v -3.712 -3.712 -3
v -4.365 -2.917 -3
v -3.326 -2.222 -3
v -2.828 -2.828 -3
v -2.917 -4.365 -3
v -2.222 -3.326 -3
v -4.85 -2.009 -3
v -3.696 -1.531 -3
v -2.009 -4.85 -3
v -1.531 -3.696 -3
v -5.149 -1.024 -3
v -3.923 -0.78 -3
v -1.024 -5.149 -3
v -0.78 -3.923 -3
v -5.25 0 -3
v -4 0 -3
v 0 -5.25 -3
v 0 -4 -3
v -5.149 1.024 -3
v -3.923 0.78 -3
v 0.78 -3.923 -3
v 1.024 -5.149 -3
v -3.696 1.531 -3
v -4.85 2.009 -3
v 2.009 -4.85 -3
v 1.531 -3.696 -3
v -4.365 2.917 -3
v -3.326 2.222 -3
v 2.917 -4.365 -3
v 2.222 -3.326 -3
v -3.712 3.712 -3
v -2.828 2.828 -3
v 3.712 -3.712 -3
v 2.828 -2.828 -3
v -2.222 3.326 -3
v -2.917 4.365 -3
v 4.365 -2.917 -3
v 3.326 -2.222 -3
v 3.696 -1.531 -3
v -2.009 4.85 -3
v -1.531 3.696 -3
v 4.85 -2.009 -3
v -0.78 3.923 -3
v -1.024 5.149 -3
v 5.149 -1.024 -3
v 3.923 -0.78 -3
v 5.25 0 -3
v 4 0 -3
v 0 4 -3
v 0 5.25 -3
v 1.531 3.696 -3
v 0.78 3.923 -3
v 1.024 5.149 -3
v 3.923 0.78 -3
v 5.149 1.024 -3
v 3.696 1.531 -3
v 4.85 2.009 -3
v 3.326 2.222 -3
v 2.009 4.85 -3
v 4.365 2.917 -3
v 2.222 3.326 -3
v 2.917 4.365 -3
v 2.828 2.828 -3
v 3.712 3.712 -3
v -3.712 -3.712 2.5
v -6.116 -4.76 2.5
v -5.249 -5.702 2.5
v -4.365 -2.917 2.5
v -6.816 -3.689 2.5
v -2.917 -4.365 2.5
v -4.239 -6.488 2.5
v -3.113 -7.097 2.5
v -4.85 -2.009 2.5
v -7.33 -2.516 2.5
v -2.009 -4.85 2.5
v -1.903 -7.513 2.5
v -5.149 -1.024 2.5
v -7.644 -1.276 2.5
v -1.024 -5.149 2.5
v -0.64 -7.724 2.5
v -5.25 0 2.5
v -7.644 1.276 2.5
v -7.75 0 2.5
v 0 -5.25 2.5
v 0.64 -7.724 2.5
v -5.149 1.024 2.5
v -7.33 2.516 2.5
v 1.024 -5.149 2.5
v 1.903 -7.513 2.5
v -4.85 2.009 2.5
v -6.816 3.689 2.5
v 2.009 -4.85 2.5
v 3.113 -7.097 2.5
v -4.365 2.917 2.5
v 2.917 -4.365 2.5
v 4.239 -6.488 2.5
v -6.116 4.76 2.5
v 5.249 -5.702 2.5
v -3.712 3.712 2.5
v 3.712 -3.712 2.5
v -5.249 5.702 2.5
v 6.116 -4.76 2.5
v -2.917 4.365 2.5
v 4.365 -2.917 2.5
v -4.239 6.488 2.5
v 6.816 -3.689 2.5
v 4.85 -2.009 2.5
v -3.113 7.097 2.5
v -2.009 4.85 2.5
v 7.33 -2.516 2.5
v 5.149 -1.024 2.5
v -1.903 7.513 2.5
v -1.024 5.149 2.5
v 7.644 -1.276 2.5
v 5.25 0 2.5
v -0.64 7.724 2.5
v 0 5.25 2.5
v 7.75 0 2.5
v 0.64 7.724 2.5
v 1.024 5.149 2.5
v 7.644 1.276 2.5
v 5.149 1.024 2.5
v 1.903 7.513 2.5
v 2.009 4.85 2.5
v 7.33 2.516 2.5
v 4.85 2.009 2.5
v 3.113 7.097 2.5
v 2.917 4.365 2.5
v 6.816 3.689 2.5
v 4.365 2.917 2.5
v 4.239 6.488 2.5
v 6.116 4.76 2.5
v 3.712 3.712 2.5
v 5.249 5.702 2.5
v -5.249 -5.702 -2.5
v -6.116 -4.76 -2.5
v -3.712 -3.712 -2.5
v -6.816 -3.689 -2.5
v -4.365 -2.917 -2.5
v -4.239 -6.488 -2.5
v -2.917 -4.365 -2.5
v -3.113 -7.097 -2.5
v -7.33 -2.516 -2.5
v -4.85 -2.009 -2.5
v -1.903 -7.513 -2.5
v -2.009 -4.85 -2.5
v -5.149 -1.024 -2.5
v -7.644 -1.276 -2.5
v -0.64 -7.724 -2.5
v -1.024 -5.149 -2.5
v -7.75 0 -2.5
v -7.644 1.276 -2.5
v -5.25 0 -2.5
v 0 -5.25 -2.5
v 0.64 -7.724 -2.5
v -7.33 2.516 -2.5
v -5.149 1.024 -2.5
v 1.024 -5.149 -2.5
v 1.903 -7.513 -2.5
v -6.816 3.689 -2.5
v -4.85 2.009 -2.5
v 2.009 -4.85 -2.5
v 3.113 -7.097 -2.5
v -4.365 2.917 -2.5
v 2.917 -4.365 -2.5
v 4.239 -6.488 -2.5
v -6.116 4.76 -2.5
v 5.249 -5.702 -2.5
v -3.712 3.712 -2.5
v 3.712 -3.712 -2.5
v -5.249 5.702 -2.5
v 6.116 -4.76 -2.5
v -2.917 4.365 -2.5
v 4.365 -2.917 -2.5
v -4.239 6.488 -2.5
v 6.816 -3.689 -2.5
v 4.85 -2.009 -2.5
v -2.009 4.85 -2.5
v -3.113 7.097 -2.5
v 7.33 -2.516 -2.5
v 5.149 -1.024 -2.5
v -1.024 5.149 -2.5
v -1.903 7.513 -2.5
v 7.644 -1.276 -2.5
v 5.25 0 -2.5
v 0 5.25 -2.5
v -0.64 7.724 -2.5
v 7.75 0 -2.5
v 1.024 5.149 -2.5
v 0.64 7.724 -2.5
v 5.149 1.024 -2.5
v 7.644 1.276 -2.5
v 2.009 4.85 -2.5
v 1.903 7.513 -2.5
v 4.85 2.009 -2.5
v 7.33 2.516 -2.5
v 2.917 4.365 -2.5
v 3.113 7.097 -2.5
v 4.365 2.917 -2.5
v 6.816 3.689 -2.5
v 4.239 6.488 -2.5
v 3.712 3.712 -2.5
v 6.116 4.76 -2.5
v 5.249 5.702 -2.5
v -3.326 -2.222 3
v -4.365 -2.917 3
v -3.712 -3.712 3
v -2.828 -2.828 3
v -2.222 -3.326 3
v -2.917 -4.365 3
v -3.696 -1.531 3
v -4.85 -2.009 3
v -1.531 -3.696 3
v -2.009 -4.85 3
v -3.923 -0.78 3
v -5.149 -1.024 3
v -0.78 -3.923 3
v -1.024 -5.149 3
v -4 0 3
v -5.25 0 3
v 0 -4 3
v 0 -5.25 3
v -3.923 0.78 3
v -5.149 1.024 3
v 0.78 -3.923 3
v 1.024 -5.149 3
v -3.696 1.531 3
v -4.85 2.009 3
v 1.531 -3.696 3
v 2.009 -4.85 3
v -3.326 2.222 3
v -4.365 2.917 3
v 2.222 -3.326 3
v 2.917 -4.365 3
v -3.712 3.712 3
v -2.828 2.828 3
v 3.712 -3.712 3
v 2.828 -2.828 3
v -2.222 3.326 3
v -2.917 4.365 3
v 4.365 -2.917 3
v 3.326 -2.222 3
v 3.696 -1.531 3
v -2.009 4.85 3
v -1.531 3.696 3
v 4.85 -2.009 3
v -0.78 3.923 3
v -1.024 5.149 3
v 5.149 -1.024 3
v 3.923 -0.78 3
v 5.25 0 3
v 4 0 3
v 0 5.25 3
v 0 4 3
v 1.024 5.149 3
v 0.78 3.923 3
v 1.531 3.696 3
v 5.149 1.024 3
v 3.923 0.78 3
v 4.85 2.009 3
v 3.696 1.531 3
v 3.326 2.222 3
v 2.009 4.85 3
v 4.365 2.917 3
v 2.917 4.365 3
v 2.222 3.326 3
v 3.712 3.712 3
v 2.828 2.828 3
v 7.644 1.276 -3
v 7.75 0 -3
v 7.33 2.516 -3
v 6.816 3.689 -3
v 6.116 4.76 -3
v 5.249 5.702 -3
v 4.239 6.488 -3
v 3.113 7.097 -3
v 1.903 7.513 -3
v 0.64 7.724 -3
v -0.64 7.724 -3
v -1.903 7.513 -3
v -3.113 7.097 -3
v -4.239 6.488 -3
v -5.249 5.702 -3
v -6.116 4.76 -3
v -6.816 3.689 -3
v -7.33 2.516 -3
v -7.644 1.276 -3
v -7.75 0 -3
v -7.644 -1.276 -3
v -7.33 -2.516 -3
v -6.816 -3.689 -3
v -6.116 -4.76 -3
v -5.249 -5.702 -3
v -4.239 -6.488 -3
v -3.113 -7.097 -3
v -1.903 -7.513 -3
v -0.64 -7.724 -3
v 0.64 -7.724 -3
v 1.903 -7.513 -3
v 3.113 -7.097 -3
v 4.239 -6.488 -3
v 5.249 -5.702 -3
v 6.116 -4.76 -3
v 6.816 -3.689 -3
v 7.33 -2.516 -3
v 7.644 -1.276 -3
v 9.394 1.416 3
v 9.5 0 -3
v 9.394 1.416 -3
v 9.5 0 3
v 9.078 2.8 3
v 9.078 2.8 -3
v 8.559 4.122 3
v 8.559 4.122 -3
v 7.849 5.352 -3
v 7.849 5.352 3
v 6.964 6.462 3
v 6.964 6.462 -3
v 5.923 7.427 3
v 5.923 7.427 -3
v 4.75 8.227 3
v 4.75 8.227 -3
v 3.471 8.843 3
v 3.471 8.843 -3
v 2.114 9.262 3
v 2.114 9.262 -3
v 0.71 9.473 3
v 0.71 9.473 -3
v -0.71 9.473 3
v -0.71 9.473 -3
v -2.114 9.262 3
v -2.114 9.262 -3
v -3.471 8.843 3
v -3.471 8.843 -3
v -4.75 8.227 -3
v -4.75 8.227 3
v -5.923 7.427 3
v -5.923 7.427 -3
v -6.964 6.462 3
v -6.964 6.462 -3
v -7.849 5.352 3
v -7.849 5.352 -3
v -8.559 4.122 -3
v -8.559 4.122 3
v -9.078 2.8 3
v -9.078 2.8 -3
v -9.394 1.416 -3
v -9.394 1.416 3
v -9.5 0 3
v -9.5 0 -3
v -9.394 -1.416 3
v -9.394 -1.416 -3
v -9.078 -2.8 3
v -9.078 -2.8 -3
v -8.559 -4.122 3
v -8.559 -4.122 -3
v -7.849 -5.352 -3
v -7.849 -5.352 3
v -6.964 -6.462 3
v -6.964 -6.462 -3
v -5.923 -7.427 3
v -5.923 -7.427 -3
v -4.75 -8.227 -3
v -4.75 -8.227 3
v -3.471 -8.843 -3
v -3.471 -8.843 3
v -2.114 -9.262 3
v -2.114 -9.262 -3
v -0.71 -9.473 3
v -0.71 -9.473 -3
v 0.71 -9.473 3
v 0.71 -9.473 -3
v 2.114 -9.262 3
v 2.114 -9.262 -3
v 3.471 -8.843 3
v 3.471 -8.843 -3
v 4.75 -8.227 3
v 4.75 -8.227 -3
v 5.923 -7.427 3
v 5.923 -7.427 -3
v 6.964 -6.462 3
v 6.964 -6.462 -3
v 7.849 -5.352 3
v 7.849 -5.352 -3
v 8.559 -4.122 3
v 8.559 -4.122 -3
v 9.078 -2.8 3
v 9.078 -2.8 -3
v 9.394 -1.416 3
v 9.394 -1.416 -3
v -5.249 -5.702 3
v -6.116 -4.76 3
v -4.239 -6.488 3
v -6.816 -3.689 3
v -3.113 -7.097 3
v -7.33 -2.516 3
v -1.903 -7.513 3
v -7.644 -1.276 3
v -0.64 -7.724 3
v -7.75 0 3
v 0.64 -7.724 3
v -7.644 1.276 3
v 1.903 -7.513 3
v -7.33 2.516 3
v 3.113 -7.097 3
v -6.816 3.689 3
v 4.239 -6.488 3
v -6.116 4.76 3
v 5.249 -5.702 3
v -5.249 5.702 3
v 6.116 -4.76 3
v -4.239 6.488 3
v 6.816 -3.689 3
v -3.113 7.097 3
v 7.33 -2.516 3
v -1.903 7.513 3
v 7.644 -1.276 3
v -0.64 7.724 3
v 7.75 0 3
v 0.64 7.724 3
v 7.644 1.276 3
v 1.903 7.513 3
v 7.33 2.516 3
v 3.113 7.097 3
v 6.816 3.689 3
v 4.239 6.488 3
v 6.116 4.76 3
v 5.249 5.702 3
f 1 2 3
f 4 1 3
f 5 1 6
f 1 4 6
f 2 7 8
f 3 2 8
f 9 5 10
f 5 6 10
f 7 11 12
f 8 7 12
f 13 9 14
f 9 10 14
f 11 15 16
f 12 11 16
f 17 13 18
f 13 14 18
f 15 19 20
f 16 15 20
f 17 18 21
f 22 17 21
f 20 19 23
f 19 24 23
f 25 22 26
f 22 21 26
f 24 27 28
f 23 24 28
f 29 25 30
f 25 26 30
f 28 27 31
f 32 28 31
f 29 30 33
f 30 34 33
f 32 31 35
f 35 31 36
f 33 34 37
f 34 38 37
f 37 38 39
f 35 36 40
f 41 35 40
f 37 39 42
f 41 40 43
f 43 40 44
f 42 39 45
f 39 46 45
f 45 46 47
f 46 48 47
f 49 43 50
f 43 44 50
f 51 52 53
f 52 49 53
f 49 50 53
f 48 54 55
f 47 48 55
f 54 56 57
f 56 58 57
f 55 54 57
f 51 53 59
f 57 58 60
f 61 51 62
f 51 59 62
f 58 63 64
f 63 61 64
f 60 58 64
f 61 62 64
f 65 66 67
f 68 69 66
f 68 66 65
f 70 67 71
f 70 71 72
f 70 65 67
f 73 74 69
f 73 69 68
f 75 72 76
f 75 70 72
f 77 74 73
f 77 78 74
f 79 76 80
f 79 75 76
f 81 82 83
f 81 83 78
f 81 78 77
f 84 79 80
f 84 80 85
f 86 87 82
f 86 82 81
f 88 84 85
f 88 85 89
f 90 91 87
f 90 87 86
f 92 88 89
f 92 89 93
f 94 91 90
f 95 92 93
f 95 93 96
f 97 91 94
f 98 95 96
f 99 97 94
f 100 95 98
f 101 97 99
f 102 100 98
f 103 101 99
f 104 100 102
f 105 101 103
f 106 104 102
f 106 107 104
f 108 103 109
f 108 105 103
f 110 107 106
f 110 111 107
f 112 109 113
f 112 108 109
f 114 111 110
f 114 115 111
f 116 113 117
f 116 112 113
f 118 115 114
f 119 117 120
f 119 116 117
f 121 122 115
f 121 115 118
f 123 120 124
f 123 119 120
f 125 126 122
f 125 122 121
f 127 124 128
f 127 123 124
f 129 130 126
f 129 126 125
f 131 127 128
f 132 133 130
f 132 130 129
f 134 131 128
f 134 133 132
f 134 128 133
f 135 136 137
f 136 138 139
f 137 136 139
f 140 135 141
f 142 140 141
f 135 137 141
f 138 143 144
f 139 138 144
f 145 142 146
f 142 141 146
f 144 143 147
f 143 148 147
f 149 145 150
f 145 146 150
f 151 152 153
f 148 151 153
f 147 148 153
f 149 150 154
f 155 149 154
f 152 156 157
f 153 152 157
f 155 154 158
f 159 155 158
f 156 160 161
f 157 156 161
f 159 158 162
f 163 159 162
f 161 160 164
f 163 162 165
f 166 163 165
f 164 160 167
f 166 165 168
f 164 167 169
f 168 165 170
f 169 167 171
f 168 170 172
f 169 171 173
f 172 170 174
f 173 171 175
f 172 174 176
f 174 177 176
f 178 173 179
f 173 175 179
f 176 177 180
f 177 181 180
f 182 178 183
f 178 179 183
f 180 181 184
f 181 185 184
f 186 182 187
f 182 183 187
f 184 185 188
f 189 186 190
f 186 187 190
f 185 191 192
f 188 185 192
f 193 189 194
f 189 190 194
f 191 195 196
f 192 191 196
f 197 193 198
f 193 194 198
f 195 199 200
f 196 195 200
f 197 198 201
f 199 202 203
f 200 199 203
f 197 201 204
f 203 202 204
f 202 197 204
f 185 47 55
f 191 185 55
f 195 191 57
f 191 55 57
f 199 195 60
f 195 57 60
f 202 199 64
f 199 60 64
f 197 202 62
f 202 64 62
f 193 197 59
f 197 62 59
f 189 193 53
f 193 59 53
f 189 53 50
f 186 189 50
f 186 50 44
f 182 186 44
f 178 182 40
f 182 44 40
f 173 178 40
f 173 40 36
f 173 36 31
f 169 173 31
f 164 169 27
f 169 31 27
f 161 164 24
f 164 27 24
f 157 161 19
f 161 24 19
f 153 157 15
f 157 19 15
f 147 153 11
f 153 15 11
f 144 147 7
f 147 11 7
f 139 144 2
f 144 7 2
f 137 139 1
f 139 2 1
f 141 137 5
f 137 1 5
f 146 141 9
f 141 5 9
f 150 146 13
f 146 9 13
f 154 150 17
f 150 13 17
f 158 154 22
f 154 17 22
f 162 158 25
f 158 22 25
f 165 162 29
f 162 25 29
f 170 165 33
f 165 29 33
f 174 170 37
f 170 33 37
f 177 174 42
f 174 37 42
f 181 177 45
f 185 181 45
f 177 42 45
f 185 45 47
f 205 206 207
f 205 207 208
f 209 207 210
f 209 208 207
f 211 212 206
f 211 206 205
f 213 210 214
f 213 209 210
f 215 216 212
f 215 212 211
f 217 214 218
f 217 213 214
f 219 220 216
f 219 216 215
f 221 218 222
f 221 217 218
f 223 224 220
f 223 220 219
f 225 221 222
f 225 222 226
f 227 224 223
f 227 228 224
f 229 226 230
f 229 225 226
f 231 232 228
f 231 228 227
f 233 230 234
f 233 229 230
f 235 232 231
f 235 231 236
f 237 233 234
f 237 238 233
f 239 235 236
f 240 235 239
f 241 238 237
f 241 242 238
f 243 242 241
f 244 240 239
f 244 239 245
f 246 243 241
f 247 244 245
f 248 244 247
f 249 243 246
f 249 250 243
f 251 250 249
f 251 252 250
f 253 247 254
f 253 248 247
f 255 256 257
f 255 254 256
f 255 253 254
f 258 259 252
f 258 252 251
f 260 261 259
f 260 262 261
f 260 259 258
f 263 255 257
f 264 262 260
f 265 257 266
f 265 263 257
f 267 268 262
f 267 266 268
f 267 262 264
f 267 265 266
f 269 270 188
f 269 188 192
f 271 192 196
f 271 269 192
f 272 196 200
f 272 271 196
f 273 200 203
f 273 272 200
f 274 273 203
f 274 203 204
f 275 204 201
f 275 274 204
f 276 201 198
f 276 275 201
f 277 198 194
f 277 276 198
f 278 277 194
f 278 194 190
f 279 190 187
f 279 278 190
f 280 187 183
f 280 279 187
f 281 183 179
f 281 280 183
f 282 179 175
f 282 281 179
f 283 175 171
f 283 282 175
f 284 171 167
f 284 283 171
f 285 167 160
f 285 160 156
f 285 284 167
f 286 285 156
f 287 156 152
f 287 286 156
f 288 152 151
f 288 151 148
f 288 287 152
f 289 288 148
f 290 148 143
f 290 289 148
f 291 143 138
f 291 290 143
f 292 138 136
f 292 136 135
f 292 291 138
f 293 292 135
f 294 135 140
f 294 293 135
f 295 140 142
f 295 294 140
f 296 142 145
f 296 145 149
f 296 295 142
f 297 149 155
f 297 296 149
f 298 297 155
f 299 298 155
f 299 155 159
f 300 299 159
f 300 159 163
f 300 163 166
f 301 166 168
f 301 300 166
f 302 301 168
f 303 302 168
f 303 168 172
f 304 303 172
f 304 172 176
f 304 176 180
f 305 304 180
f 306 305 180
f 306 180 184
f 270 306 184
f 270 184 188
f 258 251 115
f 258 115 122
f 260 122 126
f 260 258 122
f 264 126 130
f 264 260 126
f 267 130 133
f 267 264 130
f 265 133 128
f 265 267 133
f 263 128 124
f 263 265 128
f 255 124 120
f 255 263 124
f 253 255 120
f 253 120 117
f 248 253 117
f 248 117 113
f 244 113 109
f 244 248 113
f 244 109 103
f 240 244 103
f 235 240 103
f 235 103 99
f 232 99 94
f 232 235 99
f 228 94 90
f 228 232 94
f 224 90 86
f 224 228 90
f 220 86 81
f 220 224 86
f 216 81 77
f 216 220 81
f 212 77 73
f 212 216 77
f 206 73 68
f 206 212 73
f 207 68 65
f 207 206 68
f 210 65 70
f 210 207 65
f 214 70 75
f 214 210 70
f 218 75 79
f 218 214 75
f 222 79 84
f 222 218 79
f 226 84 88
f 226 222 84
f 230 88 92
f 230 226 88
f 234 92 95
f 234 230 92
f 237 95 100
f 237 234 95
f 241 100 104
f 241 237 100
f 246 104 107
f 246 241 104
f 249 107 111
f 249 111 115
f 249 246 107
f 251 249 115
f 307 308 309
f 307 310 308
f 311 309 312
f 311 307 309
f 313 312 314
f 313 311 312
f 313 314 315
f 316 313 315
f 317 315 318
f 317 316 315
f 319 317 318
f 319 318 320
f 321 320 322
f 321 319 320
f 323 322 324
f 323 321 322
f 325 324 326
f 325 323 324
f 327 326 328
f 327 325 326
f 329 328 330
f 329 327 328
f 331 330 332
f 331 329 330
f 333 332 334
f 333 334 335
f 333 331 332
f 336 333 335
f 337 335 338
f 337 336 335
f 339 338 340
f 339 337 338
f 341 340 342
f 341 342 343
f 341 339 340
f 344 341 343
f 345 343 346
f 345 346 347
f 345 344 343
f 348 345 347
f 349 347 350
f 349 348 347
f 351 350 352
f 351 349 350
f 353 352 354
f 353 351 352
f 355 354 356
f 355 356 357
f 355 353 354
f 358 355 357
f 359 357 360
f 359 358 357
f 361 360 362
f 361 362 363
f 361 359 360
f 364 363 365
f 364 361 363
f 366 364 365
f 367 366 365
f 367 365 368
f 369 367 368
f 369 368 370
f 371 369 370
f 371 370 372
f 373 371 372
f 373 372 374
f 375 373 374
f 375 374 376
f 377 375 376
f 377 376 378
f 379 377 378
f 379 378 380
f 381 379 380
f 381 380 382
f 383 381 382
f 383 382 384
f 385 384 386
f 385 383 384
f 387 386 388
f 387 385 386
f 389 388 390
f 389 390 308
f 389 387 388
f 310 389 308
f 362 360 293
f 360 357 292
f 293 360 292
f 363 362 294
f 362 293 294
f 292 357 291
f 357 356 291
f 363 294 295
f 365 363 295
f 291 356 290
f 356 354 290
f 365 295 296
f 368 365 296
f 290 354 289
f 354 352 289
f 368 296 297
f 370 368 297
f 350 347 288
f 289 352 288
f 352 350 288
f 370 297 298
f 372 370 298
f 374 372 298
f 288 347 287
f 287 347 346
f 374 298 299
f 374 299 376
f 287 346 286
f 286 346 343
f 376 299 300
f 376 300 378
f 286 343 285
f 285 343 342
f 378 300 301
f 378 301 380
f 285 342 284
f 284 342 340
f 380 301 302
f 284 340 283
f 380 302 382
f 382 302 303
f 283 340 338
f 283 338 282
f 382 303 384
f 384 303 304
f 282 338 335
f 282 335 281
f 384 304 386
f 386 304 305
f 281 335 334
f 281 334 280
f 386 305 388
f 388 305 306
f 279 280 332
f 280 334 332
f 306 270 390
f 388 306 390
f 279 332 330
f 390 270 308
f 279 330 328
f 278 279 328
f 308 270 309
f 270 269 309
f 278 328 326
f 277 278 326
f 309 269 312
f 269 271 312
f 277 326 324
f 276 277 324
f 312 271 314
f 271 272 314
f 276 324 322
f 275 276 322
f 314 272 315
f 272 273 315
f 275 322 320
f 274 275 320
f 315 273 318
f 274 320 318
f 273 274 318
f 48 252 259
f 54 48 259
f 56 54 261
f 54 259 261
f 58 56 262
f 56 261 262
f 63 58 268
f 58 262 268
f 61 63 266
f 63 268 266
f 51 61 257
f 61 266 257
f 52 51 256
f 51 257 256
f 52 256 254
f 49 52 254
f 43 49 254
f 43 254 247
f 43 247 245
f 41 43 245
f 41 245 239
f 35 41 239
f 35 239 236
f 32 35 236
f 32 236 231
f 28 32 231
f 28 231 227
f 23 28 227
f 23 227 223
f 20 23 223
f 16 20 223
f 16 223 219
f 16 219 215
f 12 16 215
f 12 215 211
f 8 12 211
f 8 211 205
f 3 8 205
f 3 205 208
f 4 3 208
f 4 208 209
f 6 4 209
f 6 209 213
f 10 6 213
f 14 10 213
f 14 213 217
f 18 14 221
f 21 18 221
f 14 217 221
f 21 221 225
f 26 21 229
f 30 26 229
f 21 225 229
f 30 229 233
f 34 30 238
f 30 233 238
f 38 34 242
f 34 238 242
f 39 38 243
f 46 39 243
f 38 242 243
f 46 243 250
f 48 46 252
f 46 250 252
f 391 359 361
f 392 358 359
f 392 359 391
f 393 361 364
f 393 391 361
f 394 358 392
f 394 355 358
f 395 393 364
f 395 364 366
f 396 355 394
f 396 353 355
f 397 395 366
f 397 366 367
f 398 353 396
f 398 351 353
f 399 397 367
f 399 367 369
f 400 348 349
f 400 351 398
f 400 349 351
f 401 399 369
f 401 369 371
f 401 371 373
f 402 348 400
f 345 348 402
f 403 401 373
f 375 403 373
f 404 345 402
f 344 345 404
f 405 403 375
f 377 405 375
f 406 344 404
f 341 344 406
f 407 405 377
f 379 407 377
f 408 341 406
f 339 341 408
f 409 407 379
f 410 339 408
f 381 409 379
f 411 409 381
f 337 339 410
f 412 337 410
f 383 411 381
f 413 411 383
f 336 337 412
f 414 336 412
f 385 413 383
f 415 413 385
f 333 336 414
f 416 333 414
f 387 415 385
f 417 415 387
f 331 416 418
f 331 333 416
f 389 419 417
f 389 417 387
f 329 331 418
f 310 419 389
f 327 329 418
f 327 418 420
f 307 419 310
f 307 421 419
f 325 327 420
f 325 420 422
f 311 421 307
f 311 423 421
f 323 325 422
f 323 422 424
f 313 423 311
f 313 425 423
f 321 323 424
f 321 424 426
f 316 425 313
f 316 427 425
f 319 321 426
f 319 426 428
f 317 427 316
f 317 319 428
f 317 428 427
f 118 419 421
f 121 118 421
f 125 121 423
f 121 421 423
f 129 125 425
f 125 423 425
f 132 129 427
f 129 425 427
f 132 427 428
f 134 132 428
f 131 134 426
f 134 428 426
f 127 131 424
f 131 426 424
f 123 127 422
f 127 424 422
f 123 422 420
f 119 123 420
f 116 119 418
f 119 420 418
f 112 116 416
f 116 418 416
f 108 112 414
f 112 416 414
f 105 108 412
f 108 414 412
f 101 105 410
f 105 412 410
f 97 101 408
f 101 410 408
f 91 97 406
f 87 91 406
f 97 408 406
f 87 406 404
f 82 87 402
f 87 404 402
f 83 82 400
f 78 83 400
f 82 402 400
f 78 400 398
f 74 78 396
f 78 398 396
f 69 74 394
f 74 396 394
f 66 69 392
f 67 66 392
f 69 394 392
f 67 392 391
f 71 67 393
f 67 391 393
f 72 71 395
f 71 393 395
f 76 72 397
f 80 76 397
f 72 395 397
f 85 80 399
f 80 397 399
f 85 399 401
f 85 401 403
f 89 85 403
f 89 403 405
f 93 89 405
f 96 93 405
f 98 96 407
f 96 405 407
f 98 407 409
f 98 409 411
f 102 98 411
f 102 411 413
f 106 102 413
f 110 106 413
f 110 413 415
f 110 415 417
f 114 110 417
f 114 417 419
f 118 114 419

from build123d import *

# Parameters (mm, degrees)
SKETCH_1_R          = 9.5
EXTRUDE_1_DEPTH     = 3
SKETCH_2_R          = 4
CUT_EXTRUDE_1_DEPTH = 7
SKETCH_3_R          = 7.75
SKETCH_3_R_2        = 5.25
CUT_EXTRUDE_2_DEPTH = 0.5


with BuildPart() as part:
    # 草圖1 → 填料-伸長1 (new body, symmetric)
    with BuildSketch(Plane.XY):
        Circle(SKETCH_1_R)
    extrude(amount=EXTRUDE_1_DEPTH, both=True)

    # 草圖2 → 除料-伸長1 (cut, through all)
    with BuildSketch(Plane.XY.offset(3)):
        Circle(SKETCH_2_R)
    extrude(amount=-CUT_EXTRUDE_1_DEPTH, mode=Mode.SUBTRACT)

    # 草圖3 → 除料-伸長2 (cut)
    with BuildSketch(Plane.XY.offset(3)):
        Circle(SKETCH_3_R)
        Circle(SKETCH_3_R_2, mode=Mode.SUBTRACT)
    cut_extrude_2 = extrude(amount=-CUT_EXTRUDE_2_DEPTH, mode=Mode.SUBTRACT)

    # 鏡射1: 除料-伸長2 across plane
    add(cut_extrude_2.mirror(Plane.XY), mode=Mode.SUBTRACT)


solid = part.part
